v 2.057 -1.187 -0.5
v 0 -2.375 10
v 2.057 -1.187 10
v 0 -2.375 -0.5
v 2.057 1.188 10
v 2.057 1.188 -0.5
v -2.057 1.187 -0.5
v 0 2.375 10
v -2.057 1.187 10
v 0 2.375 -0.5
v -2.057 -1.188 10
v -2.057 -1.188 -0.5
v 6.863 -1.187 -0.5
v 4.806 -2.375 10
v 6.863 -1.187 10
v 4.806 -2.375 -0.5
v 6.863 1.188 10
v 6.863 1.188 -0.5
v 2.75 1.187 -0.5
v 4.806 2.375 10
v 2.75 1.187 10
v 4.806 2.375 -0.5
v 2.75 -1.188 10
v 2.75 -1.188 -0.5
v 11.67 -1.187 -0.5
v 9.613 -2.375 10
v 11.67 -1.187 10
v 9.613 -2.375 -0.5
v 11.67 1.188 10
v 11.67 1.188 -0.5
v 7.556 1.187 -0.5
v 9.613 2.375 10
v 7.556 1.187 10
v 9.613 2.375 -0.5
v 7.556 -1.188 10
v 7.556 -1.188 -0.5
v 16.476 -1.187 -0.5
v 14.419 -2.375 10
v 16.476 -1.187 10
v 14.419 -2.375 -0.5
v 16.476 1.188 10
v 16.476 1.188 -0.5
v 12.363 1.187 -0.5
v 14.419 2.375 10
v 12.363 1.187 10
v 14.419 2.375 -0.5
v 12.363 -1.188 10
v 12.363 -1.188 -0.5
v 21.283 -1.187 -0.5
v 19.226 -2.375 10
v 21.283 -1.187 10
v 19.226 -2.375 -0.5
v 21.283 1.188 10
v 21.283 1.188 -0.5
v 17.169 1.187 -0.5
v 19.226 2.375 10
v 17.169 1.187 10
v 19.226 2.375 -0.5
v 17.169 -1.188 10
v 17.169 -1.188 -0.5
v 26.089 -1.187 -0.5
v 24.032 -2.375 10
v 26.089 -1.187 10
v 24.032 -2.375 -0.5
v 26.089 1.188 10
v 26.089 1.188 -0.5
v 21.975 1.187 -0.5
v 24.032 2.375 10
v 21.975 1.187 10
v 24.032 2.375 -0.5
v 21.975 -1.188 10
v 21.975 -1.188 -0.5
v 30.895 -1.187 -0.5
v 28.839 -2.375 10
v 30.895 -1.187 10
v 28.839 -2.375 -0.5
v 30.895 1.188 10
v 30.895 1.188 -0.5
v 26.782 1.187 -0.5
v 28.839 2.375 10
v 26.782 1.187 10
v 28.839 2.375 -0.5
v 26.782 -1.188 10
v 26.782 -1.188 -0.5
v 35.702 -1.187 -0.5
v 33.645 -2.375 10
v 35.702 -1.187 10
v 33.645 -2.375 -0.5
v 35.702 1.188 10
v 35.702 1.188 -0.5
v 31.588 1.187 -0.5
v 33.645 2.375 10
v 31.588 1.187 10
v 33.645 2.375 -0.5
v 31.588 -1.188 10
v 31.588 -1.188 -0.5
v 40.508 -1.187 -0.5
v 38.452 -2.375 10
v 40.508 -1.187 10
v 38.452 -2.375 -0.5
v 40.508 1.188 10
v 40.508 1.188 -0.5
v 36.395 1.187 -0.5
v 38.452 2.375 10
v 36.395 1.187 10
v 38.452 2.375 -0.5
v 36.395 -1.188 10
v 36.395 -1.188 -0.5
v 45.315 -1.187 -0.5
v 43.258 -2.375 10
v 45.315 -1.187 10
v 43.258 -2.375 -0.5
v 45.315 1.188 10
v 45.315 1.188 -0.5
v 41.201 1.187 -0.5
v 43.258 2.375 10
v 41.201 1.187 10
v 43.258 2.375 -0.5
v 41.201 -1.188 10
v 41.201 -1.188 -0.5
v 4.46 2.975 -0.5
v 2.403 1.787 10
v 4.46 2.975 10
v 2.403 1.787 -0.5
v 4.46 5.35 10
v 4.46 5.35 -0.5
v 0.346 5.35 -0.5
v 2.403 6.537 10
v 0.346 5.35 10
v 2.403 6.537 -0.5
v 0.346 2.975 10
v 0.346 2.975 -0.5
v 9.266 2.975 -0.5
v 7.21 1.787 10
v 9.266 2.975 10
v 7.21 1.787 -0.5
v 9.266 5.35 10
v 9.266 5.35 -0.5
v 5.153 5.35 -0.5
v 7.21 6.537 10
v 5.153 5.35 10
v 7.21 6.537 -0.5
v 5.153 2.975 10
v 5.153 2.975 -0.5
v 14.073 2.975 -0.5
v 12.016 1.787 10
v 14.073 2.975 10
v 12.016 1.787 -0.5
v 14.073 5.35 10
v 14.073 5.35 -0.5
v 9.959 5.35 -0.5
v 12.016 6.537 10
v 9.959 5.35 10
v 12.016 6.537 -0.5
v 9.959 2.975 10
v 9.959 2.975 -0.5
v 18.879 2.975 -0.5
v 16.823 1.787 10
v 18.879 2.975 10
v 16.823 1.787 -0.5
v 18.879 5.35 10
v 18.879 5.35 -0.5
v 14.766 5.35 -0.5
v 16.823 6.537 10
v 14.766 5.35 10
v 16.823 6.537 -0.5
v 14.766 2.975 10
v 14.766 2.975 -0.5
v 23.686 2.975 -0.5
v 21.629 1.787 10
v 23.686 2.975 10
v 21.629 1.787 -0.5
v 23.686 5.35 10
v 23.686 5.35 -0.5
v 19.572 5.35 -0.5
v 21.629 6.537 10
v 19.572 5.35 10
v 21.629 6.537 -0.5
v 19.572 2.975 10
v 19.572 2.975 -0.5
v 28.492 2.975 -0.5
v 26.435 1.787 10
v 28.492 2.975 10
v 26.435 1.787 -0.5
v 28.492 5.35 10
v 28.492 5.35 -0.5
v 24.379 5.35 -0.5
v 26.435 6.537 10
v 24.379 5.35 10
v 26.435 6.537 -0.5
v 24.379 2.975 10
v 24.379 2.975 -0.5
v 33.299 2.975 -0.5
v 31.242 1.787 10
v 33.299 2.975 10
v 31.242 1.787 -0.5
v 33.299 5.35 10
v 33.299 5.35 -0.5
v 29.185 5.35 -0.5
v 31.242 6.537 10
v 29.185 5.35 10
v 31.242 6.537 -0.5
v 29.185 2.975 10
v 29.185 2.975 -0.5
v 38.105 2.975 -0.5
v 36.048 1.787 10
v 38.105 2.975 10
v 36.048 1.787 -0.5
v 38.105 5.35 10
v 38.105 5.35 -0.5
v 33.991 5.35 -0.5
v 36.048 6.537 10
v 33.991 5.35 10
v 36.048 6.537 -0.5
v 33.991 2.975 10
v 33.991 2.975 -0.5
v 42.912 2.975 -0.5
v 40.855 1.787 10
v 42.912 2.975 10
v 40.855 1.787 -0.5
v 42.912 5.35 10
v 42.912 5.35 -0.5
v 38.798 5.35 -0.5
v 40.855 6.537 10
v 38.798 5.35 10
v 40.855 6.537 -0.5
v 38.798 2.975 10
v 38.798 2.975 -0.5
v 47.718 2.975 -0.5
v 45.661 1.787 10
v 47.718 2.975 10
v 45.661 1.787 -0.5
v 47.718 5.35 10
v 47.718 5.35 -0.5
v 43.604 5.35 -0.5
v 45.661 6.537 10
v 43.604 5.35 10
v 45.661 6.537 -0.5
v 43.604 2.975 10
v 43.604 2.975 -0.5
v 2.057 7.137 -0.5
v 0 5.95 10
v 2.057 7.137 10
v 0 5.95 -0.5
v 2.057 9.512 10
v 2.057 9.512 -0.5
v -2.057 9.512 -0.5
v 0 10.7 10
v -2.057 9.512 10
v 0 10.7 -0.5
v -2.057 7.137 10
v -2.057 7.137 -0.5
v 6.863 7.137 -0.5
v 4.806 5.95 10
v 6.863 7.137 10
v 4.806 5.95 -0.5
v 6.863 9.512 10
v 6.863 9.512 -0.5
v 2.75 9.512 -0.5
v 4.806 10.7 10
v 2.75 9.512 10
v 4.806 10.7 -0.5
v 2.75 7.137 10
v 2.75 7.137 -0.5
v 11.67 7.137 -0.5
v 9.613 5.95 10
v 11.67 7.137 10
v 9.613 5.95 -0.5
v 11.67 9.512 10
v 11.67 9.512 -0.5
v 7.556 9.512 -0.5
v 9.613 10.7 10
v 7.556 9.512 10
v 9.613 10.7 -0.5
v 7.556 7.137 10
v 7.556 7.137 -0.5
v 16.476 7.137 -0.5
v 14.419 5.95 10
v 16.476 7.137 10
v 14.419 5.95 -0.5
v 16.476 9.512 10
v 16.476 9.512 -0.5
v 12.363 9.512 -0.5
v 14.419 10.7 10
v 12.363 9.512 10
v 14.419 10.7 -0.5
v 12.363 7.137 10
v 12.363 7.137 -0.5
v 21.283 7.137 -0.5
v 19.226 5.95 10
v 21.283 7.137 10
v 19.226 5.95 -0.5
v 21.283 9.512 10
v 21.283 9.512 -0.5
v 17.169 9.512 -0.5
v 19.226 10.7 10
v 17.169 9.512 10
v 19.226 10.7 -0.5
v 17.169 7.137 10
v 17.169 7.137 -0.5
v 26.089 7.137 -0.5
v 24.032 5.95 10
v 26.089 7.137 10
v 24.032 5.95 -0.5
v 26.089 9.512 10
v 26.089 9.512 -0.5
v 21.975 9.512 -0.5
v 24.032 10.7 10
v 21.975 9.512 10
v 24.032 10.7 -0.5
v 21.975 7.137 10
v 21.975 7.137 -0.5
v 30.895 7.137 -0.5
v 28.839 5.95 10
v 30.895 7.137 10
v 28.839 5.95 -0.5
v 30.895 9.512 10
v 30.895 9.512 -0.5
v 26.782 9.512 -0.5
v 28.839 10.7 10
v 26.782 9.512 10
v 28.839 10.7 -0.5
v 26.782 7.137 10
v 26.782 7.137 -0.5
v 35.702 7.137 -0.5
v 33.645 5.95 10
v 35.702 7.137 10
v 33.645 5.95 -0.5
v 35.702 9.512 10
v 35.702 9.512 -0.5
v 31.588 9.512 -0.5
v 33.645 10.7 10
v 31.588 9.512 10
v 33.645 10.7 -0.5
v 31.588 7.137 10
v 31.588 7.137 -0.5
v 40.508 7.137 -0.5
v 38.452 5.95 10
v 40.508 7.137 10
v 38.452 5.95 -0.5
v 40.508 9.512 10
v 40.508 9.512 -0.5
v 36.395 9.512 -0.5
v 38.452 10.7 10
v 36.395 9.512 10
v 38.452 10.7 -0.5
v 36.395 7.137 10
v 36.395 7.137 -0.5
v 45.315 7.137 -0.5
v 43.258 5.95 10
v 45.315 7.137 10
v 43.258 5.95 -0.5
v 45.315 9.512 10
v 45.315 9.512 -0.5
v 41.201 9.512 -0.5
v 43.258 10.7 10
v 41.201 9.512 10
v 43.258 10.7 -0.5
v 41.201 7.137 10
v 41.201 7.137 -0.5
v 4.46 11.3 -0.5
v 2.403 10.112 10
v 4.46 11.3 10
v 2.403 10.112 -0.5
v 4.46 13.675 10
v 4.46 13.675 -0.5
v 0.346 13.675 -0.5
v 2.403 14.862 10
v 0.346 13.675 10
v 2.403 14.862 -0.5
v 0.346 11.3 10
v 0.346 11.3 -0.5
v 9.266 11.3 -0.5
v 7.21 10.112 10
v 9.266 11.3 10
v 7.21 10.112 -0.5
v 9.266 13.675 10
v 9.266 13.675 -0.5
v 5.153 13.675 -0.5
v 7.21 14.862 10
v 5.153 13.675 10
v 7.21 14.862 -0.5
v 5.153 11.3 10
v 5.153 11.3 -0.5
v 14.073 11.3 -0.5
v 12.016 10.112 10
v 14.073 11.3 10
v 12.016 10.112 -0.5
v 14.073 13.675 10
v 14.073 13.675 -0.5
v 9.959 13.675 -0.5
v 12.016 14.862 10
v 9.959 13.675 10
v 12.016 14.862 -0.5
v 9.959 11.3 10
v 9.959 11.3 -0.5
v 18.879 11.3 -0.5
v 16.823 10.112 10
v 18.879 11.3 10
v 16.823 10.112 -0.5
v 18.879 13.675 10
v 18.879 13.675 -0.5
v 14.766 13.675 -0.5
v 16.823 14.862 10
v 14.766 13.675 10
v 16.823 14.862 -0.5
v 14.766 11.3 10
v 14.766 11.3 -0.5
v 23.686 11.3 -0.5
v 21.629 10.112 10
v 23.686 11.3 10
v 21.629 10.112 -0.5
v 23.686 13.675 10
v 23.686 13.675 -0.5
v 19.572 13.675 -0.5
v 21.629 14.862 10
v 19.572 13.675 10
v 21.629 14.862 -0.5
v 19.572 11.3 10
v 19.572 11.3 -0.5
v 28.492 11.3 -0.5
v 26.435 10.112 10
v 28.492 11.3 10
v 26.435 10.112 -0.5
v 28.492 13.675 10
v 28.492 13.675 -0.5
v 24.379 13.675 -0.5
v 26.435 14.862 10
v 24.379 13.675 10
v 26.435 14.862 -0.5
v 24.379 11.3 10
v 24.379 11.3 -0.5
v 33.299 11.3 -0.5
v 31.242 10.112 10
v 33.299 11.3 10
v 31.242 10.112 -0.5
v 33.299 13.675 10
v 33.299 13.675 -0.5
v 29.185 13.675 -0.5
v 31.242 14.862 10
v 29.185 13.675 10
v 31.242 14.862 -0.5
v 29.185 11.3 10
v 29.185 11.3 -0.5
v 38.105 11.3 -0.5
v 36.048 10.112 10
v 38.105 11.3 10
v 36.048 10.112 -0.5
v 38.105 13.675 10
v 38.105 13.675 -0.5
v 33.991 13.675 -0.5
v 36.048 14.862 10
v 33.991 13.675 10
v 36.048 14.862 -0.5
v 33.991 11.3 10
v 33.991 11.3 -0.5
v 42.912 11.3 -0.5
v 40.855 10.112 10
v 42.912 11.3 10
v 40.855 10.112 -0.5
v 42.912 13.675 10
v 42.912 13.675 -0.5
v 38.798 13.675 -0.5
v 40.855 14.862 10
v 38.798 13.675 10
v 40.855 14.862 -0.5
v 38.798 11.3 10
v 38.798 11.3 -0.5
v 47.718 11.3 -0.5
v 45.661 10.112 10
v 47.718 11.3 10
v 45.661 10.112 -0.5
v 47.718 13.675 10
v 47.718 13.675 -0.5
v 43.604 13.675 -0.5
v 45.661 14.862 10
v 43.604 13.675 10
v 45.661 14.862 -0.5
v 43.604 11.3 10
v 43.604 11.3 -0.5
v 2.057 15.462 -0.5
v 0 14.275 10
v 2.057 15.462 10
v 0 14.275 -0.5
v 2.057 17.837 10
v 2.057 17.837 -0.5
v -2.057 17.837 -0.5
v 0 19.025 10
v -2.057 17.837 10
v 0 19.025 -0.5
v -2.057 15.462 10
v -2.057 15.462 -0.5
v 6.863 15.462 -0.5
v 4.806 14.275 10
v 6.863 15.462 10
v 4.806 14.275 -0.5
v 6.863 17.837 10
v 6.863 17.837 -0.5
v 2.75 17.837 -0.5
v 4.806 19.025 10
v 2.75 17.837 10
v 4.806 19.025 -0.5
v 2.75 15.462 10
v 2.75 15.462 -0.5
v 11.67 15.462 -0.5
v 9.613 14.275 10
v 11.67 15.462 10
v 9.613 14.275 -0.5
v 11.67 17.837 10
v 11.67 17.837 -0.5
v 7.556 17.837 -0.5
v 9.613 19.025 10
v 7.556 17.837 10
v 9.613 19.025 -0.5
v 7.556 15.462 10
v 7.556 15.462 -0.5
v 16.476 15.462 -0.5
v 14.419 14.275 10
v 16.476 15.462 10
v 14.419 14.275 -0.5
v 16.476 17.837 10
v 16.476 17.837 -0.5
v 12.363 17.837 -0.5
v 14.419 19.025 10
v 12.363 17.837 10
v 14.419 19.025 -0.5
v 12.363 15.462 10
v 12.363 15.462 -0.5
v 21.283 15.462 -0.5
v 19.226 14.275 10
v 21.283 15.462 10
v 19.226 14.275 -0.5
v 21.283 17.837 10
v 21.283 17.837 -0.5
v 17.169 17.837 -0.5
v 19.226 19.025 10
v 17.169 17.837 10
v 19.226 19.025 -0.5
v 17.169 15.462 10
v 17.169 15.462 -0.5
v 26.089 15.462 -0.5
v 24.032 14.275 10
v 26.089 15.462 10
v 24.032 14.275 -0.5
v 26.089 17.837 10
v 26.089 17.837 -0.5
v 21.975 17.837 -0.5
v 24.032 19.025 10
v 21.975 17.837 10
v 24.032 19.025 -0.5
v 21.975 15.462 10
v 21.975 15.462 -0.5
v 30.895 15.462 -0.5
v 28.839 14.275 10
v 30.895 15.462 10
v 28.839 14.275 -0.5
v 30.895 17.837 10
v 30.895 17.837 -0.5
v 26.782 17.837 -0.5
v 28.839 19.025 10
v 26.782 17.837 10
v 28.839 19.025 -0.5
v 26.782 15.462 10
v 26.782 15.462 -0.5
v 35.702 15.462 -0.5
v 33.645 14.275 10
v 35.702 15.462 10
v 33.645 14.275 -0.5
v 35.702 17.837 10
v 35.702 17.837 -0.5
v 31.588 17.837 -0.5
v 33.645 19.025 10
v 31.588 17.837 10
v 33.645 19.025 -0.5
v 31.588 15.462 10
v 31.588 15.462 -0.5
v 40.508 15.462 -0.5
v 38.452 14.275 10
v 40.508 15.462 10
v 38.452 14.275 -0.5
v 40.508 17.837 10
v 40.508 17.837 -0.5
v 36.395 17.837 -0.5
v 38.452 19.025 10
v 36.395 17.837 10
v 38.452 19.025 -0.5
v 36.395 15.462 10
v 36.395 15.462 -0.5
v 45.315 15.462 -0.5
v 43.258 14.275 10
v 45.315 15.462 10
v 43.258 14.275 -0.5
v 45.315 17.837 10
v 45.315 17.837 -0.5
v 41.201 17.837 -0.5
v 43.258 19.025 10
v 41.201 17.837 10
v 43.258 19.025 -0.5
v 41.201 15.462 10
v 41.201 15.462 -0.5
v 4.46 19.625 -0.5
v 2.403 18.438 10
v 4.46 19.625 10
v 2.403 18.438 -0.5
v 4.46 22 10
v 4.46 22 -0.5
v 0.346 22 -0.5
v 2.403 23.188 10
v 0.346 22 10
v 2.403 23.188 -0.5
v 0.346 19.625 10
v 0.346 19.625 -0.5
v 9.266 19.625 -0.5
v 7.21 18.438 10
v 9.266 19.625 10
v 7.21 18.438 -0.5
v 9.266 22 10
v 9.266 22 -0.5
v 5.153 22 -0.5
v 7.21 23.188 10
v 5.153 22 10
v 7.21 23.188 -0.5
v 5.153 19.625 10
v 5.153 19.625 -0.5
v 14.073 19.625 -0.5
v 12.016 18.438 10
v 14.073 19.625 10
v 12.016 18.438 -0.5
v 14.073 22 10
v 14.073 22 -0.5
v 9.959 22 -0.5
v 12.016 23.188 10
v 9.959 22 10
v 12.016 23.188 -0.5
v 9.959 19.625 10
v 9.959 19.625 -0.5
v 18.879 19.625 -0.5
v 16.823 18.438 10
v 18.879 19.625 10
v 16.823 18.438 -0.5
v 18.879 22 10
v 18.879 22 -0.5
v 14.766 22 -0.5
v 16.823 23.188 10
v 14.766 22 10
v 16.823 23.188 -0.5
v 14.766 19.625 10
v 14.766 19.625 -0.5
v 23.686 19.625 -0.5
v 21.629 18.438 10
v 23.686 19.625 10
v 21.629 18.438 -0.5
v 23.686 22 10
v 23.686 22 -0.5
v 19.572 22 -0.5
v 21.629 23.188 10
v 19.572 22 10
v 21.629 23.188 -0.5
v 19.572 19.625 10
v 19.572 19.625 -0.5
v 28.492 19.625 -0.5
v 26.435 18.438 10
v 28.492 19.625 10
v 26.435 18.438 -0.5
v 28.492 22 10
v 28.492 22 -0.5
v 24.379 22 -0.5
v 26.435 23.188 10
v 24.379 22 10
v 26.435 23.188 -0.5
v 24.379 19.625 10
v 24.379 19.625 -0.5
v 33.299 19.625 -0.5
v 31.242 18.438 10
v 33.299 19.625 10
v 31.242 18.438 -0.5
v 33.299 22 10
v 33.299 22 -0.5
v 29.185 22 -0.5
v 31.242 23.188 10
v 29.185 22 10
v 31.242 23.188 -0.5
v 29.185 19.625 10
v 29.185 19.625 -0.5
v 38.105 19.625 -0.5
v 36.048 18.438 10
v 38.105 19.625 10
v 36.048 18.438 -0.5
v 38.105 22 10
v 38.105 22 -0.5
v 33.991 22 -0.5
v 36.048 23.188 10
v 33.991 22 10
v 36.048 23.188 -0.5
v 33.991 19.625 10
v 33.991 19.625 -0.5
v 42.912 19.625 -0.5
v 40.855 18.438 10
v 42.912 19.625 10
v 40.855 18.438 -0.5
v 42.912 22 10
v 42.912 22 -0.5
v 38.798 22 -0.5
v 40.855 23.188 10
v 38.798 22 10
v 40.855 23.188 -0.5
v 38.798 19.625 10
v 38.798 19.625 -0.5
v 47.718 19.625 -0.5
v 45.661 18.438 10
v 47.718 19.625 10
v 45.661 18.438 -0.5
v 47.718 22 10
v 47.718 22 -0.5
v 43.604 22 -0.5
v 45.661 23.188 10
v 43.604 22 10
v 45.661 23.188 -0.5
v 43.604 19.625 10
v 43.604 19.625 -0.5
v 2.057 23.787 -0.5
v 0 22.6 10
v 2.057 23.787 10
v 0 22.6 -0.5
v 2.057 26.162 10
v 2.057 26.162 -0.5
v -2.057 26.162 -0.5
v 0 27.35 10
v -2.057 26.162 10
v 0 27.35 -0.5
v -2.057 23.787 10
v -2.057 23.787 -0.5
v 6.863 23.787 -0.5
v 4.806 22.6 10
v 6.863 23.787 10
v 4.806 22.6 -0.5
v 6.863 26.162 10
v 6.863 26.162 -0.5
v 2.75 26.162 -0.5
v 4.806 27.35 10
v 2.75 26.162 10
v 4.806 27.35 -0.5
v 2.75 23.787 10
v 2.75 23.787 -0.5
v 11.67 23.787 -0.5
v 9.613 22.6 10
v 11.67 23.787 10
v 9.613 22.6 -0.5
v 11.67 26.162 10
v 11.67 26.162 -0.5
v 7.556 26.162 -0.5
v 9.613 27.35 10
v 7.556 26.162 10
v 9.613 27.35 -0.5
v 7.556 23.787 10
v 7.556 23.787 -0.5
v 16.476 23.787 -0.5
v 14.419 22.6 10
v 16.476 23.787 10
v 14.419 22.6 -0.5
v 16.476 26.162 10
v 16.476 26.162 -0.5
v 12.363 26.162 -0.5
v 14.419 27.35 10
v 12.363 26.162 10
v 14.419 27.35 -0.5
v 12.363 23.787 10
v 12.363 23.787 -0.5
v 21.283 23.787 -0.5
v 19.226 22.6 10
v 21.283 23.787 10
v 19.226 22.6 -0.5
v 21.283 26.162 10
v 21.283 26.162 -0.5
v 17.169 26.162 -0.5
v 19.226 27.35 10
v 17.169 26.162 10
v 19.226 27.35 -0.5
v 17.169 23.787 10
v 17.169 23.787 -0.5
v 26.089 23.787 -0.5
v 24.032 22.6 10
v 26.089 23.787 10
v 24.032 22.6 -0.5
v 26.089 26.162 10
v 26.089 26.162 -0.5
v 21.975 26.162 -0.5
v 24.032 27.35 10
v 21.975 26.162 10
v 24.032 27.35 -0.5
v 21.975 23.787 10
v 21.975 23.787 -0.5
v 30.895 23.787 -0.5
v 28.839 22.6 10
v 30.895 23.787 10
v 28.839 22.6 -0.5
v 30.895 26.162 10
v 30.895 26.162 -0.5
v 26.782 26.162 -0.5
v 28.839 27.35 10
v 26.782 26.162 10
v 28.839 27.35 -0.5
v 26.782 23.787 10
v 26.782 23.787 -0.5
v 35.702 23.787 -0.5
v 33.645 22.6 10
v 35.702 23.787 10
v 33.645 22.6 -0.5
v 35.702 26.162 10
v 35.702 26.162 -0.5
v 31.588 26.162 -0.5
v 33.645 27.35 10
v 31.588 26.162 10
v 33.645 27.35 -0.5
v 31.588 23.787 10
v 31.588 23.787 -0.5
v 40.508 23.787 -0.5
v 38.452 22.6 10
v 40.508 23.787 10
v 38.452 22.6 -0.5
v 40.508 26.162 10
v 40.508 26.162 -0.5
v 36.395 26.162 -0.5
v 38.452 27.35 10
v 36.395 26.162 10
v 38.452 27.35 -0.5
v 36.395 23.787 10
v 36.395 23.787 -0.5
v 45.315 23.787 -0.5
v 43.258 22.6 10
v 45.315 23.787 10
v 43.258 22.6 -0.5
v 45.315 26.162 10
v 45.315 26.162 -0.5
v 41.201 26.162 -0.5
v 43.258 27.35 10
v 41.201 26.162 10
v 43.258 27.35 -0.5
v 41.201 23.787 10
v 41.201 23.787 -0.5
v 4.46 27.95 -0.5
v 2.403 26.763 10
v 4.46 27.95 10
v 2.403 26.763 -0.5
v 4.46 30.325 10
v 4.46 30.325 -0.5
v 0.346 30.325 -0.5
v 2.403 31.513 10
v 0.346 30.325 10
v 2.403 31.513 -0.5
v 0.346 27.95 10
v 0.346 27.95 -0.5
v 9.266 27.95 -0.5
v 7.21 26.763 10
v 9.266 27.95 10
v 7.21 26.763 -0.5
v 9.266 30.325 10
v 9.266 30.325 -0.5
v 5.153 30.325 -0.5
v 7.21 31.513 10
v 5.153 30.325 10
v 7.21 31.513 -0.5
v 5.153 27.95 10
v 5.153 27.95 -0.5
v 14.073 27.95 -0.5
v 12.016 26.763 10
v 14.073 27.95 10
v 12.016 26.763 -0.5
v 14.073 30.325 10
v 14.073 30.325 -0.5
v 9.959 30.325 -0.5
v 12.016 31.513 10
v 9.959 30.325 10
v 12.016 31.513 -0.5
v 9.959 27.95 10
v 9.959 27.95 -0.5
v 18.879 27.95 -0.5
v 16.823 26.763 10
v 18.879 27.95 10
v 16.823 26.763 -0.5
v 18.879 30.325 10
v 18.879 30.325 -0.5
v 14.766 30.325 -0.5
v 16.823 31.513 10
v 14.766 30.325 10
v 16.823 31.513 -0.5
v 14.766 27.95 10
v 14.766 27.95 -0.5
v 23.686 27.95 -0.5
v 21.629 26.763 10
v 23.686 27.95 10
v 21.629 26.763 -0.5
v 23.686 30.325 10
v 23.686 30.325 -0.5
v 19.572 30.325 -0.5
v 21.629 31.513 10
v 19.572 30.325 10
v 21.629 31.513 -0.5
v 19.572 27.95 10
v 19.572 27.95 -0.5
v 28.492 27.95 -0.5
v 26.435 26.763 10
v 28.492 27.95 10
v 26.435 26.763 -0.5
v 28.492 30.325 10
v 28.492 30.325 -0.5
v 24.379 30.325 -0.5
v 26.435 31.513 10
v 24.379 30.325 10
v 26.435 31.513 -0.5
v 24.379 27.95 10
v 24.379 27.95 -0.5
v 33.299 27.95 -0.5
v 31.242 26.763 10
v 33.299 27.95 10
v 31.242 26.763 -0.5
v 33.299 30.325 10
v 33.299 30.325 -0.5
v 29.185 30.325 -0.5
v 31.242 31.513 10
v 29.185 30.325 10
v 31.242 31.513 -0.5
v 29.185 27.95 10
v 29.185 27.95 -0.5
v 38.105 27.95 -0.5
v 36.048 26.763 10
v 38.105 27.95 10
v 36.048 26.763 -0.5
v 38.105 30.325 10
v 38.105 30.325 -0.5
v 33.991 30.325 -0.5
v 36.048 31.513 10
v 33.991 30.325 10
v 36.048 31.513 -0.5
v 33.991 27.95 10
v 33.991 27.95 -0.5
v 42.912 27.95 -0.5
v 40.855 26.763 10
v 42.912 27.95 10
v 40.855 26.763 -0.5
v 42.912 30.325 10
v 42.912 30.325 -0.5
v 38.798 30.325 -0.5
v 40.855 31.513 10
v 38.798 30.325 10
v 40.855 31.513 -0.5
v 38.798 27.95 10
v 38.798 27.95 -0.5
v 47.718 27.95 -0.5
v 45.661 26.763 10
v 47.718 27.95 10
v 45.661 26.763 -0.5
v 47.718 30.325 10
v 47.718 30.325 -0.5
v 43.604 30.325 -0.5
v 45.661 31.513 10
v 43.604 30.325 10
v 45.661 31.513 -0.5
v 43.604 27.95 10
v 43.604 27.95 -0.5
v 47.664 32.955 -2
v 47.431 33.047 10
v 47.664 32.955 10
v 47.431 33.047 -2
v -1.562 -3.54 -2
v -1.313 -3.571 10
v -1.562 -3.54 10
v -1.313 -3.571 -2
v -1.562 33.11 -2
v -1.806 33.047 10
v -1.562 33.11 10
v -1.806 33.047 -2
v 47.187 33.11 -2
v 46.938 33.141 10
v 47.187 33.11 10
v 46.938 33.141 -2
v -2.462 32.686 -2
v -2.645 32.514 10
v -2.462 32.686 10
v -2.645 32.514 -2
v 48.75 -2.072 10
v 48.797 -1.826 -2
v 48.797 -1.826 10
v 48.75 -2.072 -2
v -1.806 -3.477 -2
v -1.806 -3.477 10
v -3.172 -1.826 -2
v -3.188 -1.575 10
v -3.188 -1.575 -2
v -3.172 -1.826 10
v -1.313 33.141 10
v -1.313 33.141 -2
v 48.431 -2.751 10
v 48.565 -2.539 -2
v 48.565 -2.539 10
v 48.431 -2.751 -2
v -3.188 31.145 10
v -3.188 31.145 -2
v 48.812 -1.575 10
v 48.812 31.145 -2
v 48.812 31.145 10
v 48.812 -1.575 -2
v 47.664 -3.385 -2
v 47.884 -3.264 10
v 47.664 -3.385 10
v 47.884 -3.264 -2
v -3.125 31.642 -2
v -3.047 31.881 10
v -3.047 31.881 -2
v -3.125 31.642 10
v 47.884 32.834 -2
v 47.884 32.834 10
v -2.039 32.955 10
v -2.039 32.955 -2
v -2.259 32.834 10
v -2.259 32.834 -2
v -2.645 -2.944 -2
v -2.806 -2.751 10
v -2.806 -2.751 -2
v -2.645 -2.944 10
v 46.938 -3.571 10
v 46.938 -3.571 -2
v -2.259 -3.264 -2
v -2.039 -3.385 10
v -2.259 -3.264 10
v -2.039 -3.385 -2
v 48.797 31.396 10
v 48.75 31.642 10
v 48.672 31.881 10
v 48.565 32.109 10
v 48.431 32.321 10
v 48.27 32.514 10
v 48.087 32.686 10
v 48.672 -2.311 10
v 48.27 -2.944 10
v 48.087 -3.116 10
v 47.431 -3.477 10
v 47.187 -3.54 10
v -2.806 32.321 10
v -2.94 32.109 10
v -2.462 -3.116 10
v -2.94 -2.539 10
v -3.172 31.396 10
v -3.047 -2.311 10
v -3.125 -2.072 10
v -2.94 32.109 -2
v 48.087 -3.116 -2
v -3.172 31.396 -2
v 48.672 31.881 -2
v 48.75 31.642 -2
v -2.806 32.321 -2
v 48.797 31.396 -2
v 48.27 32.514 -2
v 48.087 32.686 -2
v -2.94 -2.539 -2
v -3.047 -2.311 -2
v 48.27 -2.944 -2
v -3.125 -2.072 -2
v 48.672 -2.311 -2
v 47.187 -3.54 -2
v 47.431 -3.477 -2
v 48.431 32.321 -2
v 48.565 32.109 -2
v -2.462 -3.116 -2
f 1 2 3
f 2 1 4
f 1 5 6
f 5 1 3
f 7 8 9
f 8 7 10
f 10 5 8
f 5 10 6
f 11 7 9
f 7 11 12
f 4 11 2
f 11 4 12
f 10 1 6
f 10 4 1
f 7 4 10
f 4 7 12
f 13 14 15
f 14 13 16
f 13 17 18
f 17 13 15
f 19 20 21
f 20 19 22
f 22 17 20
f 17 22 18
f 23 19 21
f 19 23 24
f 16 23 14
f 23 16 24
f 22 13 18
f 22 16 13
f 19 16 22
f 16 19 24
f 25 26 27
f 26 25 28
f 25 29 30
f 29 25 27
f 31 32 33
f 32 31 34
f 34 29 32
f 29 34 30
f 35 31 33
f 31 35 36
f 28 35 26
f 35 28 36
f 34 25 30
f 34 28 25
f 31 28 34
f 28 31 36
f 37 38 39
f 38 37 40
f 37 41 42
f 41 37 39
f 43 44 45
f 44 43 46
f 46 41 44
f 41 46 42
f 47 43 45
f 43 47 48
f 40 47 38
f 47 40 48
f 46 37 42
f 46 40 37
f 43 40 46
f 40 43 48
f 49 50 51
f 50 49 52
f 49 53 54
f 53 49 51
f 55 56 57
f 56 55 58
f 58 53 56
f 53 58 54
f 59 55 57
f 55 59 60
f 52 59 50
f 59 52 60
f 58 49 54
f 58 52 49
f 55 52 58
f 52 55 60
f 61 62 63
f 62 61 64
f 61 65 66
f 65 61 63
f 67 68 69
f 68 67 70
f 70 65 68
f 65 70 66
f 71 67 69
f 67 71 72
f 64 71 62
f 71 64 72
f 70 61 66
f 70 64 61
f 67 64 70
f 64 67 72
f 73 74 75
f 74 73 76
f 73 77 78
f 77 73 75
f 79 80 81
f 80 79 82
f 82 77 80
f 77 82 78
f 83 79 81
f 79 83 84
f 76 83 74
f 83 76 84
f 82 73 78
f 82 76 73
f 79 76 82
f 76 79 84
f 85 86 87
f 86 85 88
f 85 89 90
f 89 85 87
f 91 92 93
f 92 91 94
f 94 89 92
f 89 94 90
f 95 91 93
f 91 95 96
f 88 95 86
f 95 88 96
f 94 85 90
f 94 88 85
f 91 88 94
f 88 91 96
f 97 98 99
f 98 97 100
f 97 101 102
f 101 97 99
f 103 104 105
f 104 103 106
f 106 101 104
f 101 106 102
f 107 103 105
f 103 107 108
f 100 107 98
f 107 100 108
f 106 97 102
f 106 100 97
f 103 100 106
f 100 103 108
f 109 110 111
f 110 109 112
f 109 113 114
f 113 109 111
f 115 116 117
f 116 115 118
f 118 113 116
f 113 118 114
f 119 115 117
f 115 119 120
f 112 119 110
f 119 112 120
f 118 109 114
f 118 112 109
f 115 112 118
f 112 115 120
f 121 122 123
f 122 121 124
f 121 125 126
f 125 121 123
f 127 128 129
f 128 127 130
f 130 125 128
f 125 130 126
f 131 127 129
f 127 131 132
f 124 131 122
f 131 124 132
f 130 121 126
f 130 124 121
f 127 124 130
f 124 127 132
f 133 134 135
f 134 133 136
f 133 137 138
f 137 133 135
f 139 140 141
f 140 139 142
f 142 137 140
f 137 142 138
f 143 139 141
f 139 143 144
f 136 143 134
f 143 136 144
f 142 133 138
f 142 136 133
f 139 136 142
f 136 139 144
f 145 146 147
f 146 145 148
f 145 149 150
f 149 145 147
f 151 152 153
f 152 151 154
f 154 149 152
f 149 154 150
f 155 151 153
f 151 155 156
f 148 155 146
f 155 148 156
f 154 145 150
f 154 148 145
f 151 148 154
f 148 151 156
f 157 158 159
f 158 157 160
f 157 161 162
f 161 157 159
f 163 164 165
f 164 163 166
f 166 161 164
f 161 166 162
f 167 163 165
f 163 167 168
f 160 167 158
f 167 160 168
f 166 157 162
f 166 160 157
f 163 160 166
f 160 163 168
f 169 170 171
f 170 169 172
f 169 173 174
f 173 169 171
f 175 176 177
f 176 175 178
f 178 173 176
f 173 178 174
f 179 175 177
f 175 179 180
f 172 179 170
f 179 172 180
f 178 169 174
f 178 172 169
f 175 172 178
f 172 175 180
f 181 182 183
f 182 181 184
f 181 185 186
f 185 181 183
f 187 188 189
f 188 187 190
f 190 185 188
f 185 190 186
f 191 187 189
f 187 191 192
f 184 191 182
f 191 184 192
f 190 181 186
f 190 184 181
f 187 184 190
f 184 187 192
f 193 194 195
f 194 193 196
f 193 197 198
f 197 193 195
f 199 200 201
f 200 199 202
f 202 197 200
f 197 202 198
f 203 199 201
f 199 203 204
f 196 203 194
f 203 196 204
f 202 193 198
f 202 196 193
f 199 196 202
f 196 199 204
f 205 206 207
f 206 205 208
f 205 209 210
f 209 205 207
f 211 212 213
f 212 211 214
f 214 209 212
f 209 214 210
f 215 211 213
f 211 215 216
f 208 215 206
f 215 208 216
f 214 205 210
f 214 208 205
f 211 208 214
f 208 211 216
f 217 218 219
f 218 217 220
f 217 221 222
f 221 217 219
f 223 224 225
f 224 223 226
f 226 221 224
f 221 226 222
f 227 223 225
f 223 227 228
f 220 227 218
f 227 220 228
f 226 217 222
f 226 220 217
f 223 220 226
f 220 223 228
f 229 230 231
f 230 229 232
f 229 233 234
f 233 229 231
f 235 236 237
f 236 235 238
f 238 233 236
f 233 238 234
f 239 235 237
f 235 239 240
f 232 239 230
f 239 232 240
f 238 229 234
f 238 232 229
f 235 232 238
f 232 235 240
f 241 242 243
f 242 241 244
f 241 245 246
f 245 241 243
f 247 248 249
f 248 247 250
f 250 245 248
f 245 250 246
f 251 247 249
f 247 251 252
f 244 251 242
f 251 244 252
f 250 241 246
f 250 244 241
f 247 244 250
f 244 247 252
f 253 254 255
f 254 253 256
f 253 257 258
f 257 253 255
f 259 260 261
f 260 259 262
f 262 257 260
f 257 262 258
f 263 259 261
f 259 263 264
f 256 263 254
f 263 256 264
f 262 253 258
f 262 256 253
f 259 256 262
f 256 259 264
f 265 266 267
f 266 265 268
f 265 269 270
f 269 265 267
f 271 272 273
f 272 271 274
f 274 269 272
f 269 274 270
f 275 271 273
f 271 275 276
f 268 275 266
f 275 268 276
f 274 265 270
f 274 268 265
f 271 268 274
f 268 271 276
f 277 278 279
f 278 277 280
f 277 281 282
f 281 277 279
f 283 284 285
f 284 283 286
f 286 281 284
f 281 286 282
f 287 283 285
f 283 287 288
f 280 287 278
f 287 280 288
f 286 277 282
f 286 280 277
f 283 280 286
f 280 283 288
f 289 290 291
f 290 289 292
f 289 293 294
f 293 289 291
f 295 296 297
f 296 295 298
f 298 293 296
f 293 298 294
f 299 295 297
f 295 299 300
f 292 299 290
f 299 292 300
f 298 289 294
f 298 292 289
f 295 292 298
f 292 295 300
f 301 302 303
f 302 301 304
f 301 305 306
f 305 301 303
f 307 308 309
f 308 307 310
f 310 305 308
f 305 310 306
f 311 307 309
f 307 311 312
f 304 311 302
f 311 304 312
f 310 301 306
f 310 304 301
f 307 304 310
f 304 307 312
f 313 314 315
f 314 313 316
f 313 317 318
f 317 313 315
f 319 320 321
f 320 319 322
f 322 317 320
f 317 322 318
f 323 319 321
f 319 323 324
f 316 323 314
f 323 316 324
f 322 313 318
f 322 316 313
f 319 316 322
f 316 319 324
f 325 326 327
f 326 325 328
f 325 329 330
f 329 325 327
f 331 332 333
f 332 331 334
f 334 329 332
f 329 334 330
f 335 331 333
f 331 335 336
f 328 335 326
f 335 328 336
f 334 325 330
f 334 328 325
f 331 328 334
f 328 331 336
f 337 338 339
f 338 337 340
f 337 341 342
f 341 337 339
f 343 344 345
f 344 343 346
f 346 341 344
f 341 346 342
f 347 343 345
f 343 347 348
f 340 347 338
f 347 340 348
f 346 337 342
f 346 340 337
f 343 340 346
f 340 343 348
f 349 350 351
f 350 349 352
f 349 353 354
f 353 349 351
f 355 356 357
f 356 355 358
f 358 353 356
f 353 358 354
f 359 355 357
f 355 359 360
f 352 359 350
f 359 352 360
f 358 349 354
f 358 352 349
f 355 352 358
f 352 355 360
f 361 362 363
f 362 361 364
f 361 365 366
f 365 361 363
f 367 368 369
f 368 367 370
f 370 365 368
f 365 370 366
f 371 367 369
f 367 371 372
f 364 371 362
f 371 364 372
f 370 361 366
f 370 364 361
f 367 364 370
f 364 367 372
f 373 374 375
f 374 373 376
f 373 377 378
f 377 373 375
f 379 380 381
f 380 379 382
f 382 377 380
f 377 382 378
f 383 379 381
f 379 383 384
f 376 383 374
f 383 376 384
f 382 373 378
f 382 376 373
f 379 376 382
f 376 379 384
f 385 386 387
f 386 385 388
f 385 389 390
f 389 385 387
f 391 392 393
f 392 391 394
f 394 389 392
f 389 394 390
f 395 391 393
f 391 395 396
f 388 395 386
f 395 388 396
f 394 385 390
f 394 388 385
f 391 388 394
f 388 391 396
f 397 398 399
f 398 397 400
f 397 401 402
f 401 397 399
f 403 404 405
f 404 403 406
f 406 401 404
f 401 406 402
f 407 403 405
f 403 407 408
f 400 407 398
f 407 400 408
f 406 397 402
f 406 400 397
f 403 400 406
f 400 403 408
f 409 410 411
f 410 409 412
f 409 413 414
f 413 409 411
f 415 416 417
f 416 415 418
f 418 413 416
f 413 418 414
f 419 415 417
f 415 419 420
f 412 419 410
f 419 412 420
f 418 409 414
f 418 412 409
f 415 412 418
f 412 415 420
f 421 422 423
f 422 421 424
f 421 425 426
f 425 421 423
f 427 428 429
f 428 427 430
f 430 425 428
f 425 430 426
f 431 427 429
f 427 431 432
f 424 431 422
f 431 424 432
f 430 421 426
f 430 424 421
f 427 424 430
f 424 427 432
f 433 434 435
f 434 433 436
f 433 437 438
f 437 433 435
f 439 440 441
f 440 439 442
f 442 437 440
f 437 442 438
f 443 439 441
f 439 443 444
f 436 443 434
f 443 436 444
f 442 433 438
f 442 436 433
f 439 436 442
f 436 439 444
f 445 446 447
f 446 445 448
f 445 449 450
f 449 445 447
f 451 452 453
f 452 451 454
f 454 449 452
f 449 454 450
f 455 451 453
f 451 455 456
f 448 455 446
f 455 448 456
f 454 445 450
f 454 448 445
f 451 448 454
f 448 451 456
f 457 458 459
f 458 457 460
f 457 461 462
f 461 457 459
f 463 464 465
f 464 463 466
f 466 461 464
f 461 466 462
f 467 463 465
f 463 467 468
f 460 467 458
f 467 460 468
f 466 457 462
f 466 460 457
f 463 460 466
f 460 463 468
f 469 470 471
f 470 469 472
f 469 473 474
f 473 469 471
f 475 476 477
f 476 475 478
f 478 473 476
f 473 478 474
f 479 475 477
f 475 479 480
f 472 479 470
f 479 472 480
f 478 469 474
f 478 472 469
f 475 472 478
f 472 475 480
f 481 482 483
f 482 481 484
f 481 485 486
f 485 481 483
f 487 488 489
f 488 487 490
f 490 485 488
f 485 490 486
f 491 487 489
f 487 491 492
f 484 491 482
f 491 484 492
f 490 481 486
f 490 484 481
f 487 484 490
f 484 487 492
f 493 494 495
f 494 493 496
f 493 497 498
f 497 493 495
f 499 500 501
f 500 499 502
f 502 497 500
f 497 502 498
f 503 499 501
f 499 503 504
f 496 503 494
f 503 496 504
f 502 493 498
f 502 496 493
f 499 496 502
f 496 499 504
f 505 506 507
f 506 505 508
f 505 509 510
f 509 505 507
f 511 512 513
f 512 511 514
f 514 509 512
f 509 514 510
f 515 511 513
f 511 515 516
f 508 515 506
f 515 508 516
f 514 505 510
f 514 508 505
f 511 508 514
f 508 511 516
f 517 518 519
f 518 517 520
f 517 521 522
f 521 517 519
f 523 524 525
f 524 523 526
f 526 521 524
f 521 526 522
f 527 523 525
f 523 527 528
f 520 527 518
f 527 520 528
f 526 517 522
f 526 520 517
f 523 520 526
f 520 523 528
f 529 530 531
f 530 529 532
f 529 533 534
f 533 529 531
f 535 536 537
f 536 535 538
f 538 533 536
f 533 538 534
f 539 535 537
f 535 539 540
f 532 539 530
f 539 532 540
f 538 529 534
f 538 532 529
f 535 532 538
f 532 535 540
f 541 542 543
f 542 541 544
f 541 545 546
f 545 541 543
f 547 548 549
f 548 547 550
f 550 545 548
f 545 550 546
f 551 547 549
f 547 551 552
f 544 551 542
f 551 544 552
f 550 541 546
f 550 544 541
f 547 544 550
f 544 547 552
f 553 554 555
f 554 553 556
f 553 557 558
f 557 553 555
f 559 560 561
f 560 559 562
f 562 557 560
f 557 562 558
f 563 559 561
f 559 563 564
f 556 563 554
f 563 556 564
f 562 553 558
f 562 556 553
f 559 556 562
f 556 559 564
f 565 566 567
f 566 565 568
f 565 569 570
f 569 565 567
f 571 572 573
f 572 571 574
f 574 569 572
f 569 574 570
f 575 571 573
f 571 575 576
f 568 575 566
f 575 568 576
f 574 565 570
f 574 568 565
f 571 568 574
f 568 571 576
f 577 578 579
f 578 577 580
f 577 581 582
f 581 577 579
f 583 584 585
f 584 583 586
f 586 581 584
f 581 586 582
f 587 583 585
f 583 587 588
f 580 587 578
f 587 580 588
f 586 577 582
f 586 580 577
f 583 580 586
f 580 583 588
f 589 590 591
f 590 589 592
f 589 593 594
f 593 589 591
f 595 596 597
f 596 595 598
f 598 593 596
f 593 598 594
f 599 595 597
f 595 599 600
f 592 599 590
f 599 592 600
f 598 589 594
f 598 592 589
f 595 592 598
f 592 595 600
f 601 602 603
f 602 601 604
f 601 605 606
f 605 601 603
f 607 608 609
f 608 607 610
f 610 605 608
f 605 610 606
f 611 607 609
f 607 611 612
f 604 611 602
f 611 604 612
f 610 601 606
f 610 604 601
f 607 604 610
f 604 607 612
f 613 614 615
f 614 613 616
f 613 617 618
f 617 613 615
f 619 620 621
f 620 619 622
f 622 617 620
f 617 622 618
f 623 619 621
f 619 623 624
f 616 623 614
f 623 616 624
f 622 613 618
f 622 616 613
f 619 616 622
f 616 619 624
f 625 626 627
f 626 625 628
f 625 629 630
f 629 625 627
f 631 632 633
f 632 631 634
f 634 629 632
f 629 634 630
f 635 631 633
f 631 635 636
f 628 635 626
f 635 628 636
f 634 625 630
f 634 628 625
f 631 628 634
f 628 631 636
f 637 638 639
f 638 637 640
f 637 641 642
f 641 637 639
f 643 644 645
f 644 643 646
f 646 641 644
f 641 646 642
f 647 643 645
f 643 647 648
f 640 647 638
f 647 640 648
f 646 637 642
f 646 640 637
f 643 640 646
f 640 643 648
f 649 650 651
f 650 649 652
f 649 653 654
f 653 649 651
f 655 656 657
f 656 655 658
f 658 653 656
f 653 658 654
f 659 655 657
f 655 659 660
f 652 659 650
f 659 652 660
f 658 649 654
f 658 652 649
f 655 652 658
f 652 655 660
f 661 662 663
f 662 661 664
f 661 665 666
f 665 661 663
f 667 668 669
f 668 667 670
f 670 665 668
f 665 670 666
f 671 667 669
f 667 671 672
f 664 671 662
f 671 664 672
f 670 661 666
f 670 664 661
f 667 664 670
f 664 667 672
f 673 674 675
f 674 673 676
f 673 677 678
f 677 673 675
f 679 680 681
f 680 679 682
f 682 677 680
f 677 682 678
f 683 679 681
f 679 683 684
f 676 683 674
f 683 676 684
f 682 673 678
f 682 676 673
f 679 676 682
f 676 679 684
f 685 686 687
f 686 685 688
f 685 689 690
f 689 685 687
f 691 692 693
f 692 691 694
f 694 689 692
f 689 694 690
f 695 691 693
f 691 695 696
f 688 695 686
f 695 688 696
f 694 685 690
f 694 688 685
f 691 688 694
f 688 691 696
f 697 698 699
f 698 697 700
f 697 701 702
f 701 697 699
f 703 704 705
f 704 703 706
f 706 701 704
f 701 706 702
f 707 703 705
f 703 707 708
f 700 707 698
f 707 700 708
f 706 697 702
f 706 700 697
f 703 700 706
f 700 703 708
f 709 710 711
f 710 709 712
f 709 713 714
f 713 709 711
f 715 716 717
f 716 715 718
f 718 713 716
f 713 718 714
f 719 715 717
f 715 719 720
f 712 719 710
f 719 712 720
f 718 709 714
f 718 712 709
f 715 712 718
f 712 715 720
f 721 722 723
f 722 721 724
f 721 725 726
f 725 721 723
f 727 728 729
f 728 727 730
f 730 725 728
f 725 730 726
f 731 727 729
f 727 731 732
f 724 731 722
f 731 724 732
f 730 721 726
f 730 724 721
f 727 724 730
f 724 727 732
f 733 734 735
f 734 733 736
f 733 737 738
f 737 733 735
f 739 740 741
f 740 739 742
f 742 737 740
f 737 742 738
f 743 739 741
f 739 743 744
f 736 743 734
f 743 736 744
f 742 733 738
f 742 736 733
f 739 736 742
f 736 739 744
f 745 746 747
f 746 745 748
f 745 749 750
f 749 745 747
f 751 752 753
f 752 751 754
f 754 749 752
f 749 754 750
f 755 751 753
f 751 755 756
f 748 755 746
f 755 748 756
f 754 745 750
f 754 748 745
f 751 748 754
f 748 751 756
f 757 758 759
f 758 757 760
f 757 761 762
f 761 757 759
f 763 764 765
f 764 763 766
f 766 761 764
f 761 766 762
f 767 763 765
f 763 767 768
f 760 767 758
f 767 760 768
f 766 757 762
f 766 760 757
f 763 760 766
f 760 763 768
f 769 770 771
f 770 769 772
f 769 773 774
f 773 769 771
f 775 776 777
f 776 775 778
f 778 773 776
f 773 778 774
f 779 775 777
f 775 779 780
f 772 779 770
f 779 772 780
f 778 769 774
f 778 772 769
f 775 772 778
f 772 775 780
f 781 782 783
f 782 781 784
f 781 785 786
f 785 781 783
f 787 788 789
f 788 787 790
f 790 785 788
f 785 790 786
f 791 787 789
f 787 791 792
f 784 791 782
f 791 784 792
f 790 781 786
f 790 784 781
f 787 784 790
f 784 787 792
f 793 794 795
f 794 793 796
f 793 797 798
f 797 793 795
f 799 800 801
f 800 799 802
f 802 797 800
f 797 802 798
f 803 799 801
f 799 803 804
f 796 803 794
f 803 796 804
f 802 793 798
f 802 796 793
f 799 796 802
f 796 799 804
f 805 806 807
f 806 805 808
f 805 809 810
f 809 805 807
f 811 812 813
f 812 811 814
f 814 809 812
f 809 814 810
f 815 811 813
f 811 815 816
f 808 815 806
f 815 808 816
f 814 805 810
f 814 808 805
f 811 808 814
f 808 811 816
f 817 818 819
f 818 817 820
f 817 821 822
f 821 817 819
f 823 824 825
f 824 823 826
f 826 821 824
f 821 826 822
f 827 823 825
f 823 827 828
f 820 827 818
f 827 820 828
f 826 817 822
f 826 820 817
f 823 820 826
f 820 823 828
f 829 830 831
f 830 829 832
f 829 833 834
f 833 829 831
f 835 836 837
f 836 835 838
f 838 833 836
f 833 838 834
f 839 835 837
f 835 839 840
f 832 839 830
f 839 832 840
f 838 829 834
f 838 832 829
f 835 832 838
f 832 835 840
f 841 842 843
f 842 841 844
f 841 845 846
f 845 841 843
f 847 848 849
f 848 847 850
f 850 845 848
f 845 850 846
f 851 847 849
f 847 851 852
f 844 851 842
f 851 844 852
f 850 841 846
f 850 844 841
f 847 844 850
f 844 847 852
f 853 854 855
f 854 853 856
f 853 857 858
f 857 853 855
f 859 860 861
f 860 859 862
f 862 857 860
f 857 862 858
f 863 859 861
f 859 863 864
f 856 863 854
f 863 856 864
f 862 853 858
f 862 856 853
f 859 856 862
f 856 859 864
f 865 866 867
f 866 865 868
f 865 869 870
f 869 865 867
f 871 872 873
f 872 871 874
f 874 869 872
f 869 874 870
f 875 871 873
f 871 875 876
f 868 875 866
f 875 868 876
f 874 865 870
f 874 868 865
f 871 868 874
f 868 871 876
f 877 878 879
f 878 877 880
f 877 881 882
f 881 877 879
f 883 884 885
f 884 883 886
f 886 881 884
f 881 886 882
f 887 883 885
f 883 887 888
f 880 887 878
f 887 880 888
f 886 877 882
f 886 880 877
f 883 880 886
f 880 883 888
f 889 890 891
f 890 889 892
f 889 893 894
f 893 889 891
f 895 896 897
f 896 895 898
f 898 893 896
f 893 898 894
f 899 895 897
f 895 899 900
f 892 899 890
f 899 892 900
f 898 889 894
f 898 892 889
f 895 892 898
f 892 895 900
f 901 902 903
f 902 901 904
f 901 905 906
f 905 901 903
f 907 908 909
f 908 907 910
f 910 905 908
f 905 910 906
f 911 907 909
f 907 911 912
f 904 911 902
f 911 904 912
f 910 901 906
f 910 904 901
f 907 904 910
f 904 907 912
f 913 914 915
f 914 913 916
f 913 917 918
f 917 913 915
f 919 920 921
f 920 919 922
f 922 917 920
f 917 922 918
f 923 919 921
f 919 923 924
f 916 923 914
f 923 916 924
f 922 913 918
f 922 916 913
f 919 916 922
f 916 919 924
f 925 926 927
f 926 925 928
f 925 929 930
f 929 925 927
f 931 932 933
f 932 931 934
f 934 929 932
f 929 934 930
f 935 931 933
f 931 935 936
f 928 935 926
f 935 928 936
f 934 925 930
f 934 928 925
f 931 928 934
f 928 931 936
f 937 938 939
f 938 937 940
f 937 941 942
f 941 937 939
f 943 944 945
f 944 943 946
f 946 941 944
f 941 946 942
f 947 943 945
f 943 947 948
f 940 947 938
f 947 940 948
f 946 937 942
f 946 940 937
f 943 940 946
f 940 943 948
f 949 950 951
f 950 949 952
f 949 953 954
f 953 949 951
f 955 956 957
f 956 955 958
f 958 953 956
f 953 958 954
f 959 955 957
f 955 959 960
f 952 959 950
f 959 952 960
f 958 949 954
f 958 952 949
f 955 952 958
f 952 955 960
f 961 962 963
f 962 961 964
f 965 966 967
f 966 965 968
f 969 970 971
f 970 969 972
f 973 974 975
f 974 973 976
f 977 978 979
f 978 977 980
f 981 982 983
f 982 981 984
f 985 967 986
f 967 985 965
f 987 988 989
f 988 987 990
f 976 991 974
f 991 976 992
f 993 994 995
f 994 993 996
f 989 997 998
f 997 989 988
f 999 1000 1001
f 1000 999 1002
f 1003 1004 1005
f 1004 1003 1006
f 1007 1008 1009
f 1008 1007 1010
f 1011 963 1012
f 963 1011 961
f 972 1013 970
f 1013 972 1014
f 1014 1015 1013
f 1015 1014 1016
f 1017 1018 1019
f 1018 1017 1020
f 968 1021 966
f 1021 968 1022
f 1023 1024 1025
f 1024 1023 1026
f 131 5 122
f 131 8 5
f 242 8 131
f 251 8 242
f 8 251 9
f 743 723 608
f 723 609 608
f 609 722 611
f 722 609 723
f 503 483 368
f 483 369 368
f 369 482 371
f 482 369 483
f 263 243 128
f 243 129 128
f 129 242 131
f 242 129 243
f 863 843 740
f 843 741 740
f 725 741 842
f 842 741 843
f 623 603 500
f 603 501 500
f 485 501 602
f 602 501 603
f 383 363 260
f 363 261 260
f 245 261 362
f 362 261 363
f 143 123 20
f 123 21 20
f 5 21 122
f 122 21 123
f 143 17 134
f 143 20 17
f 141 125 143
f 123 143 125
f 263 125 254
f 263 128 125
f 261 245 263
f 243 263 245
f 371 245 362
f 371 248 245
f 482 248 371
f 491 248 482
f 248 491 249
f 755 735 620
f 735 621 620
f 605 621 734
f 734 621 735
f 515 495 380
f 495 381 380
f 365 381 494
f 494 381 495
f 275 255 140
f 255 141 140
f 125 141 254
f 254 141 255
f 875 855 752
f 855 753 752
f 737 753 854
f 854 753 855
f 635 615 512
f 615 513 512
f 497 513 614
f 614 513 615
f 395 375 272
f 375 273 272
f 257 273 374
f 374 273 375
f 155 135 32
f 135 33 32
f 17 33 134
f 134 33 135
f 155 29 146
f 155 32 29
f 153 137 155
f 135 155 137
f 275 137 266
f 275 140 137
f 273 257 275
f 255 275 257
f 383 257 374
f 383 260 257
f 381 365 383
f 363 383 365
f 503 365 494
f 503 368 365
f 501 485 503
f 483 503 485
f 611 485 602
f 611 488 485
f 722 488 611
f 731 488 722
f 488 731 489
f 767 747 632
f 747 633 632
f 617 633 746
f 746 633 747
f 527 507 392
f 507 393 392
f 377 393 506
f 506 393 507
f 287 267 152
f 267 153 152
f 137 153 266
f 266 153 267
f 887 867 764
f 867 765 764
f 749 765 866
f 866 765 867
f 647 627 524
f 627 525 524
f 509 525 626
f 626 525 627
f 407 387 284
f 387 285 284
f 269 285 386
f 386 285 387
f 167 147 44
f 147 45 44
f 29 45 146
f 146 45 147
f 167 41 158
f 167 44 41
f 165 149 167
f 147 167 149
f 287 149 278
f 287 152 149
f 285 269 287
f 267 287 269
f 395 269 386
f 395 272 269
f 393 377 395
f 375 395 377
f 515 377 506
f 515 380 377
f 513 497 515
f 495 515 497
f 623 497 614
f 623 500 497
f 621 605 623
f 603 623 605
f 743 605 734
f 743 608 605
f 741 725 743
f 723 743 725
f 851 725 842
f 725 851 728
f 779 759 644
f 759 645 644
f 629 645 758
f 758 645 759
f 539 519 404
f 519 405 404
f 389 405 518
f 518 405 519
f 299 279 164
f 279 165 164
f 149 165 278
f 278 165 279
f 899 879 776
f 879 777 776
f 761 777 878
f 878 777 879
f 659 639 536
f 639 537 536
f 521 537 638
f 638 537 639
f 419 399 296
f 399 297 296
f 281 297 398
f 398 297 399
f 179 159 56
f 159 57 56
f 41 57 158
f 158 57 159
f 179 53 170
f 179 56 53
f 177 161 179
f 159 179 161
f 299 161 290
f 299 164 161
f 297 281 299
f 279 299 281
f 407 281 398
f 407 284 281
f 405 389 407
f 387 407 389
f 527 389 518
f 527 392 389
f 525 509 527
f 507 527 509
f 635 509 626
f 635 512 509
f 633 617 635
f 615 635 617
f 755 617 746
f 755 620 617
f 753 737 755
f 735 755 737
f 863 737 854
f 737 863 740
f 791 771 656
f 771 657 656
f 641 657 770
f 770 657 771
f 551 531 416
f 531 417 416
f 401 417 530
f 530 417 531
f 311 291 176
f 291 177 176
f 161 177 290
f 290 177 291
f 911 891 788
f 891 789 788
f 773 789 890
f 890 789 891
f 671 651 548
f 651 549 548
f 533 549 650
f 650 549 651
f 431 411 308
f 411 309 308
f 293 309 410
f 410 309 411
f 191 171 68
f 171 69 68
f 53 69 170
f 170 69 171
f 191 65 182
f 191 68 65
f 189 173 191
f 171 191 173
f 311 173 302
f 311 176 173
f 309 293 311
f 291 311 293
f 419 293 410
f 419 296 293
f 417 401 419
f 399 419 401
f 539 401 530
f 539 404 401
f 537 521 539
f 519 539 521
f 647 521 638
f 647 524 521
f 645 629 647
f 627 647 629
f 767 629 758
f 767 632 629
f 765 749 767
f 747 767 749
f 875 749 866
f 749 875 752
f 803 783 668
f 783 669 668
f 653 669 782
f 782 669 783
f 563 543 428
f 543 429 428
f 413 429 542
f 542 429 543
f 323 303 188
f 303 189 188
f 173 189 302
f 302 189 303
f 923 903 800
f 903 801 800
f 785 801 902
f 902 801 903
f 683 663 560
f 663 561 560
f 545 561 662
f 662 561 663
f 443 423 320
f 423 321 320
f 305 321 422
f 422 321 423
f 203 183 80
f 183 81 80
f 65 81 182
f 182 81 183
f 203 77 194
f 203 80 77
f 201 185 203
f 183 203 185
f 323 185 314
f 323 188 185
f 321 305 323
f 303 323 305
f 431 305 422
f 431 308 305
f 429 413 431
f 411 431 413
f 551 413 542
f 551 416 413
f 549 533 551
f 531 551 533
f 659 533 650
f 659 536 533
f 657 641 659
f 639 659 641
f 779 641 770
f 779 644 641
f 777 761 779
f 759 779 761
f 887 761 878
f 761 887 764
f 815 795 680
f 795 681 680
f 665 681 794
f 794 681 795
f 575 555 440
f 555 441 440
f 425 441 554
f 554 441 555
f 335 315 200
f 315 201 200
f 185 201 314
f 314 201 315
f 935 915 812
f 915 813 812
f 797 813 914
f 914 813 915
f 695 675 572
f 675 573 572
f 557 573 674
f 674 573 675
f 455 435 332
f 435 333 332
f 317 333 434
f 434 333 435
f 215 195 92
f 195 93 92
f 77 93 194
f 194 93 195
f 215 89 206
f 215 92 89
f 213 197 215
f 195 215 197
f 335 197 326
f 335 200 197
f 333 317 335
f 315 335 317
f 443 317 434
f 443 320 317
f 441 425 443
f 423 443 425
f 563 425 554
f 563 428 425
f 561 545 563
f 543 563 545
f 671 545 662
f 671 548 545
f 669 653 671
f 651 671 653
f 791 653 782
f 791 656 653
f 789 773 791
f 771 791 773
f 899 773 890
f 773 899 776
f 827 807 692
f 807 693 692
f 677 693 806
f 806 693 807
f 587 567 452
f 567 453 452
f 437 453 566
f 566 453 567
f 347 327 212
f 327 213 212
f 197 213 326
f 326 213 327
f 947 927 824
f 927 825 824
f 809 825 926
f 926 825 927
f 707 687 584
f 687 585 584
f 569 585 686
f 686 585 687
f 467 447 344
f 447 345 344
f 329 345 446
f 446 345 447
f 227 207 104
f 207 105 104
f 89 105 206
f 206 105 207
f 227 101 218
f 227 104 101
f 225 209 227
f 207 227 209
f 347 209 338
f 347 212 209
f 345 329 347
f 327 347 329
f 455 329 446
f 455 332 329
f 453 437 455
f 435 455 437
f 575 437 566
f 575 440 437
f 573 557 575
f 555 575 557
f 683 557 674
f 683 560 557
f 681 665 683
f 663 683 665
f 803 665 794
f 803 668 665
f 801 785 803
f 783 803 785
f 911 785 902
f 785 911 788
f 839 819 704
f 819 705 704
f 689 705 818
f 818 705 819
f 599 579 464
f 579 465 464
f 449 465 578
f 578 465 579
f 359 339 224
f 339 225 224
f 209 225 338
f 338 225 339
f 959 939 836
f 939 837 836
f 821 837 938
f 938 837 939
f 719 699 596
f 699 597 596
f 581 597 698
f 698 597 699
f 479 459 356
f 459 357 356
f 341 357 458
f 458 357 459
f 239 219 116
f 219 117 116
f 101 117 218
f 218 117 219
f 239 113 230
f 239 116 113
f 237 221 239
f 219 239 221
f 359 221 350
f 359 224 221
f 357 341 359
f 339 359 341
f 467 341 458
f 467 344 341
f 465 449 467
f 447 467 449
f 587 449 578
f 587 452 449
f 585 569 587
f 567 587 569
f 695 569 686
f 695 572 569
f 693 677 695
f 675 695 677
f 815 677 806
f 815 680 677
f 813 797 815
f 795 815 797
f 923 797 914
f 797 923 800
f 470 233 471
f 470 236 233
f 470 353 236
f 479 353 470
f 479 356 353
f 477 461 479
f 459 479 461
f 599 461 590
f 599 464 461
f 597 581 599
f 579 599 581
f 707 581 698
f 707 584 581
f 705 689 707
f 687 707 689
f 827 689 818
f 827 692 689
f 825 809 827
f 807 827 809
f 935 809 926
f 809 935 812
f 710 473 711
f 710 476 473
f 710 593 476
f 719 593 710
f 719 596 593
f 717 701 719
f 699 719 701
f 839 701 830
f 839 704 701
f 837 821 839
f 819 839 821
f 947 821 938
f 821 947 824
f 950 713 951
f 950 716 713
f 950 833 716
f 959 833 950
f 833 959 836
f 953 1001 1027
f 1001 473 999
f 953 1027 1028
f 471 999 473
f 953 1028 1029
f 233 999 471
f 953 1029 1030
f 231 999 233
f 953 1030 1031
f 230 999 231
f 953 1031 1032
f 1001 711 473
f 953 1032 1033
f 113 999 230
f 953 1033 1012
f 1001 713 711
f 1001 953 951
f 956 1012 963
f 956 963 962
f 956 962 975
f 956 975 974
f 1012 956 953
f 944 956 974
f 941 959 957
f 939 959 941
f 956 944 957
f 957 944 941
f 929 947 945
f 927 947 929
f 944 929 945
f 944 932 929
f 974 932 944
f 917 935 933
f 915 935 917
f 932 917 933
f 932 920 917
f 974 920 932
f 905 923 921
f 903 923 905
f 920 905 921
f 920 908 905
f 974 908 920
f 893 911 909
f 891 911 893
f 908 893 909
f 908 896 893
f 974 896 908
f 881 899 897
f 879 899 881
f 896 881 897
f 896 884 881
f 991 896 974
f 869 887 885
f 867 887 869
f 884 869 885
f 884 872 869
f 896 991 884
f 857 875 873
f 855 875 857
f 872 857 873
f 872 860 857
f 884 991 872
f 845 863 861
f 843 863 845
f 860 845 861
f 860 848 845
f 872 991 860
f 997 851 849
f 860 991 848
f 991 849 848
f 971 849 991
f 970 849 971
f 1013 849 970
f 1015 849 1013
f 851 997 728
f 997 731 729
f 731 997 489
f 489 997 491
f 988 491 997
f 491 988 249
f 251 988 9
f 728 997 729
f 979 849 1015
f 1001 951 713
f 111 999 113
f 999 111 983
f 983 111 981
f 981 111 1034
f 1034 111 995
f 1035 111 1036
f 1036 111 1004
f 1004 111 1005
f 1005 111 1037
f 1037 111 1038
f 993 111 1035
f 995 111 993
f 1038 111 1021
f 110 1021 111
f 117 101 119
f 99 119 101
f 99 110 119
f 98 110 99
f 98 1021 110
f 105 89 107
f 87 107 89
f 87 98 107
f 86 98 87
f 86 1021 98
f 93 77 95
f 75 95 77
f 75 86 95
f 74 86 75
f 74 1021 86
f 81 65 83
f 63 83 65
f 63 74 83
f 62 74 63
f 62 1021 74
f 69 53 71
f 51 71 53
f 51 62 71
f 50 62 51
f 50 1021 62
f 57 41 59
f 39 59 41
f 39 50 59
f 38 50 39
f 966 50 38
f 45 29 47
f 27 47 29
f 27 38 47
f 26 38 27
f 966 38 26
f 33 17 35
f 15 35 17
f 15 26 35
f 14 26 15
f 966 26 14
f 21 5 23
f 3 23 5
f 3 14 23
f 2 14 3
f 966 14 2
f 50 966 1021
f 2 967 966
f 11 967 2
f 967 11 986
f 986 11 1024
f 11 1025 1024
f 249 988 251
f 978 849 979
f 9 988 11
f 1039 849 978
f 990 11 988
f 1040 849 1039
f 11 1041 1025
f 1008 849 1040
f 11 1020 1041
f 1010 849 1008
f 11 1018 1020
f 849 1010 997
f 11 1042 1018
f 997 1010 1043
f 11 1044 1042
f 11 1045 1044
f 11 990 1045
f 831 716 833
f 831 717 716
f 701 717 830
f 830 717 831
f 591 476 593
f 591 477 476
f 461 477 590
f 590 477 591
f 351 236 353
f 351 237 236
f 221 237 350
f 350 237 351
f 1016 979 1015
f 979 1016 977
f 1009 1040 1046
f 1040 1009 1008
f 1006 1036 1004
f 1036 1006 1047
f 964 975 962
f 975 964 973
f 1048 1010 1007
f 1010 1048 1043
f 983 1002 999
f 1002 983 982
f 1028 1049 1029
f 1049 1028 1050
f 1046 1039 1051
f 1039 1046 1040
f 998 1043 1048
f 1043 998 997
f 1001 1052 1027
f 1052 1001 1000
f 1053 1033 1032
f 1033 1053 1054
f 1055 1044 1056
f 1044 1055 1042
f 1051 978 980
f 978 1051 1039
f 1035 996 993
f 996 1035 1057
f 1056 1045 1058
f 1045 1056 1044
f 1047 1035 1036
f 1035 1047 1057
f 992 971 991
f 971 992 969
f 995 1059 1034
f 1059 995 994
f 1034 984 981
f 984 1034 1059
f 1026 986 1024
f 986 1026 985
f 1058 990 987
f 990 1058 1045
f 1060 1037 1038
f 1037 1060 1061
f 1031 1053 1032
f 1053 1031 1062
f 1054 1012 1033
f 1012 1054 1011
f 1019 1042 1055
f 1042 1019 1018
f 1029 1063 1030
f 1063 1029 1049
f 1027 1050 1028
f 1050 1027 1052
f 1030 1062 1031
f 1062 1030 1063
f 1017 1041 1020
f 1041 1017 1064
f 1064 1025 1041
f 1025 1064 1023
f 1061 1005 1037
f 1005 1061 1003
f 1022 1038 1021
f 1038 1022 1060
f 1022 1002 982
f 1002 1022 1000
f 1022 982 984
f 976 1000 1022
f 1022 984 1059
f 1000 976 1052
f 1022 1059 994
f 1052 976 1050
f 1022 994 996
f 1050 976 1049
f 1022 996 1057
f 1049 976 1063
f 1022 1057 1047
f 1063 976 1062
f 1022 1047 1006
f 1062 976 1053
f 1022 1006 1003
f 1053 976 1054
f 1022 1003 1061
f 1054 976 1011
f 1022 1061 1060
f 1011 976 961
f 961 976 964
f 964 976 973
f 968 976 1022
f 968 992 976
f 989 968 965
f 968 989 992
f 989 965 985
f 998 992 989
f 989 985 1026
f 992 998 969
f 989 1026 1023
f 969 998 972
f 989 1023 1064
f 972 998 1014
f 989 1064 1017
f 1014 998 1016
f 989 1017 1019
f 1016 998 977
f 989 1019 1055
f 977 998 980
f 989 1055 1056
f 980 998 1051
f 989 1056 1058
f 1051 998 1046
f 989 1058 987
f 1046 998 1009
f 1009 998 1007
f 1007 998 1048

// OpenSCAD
cellheight = 10; // depth
rows = 8;
cols = 10;

/* [hidden] */
cellrad = 0.25*25.4/2; // quarter inch diameter
cellthick = 0.8; // wall thickness

module honeycomb(rows,cols) {
	cellsize = cellrad-cellthick/2;
	voff = cellsize*1.5;
	hoff = sqrt(pow(cellsize*2,2)-pow(cellsize,2));

    for (i=[0:rows-1])
    {
		for (j=[0:cols-1])
        {
			translate([j*hoff+i%2*(hoff/2),i*voff,0])
                rotate([0,0,30])
                    translate([0,0,-0.5]) cylinder(r=cellrad-cellthick,h=cellheight+1,$fn=6);
		}
	}
}

module roundedcube(xdim, ydim, zdim, rdim) {
    hull()
    {
        translate([rdim,rdim,0]) cylinder(h=zdim,r=rdim, $fn=50);
        translate([xdim-rdim,rdim,0]) cylinder(h=zdim,r=rdim, $fn=50);
        translate([rdim,ydim-rdim,0]) cylinder(h=zdim,r=rdim, $fn=50);
        translate([xdim-rdim,ydim-rdim,0]) cylinder(h=zdim,r=rdim, $fn=50);
    }
}

// pull it all together
difference()
{
    translate([-(cellrad+cellthick)/2-1.2,-cellrad+cellthick-1.2,-2])
        roundedcube(2+cols*cellrad+(cols/2*cellrad)+cellrad-cellthick,
            2+cellthick+rows*4.14+cellthick, cellheight+2,2);
    honeycomb(rows,cols);
}
